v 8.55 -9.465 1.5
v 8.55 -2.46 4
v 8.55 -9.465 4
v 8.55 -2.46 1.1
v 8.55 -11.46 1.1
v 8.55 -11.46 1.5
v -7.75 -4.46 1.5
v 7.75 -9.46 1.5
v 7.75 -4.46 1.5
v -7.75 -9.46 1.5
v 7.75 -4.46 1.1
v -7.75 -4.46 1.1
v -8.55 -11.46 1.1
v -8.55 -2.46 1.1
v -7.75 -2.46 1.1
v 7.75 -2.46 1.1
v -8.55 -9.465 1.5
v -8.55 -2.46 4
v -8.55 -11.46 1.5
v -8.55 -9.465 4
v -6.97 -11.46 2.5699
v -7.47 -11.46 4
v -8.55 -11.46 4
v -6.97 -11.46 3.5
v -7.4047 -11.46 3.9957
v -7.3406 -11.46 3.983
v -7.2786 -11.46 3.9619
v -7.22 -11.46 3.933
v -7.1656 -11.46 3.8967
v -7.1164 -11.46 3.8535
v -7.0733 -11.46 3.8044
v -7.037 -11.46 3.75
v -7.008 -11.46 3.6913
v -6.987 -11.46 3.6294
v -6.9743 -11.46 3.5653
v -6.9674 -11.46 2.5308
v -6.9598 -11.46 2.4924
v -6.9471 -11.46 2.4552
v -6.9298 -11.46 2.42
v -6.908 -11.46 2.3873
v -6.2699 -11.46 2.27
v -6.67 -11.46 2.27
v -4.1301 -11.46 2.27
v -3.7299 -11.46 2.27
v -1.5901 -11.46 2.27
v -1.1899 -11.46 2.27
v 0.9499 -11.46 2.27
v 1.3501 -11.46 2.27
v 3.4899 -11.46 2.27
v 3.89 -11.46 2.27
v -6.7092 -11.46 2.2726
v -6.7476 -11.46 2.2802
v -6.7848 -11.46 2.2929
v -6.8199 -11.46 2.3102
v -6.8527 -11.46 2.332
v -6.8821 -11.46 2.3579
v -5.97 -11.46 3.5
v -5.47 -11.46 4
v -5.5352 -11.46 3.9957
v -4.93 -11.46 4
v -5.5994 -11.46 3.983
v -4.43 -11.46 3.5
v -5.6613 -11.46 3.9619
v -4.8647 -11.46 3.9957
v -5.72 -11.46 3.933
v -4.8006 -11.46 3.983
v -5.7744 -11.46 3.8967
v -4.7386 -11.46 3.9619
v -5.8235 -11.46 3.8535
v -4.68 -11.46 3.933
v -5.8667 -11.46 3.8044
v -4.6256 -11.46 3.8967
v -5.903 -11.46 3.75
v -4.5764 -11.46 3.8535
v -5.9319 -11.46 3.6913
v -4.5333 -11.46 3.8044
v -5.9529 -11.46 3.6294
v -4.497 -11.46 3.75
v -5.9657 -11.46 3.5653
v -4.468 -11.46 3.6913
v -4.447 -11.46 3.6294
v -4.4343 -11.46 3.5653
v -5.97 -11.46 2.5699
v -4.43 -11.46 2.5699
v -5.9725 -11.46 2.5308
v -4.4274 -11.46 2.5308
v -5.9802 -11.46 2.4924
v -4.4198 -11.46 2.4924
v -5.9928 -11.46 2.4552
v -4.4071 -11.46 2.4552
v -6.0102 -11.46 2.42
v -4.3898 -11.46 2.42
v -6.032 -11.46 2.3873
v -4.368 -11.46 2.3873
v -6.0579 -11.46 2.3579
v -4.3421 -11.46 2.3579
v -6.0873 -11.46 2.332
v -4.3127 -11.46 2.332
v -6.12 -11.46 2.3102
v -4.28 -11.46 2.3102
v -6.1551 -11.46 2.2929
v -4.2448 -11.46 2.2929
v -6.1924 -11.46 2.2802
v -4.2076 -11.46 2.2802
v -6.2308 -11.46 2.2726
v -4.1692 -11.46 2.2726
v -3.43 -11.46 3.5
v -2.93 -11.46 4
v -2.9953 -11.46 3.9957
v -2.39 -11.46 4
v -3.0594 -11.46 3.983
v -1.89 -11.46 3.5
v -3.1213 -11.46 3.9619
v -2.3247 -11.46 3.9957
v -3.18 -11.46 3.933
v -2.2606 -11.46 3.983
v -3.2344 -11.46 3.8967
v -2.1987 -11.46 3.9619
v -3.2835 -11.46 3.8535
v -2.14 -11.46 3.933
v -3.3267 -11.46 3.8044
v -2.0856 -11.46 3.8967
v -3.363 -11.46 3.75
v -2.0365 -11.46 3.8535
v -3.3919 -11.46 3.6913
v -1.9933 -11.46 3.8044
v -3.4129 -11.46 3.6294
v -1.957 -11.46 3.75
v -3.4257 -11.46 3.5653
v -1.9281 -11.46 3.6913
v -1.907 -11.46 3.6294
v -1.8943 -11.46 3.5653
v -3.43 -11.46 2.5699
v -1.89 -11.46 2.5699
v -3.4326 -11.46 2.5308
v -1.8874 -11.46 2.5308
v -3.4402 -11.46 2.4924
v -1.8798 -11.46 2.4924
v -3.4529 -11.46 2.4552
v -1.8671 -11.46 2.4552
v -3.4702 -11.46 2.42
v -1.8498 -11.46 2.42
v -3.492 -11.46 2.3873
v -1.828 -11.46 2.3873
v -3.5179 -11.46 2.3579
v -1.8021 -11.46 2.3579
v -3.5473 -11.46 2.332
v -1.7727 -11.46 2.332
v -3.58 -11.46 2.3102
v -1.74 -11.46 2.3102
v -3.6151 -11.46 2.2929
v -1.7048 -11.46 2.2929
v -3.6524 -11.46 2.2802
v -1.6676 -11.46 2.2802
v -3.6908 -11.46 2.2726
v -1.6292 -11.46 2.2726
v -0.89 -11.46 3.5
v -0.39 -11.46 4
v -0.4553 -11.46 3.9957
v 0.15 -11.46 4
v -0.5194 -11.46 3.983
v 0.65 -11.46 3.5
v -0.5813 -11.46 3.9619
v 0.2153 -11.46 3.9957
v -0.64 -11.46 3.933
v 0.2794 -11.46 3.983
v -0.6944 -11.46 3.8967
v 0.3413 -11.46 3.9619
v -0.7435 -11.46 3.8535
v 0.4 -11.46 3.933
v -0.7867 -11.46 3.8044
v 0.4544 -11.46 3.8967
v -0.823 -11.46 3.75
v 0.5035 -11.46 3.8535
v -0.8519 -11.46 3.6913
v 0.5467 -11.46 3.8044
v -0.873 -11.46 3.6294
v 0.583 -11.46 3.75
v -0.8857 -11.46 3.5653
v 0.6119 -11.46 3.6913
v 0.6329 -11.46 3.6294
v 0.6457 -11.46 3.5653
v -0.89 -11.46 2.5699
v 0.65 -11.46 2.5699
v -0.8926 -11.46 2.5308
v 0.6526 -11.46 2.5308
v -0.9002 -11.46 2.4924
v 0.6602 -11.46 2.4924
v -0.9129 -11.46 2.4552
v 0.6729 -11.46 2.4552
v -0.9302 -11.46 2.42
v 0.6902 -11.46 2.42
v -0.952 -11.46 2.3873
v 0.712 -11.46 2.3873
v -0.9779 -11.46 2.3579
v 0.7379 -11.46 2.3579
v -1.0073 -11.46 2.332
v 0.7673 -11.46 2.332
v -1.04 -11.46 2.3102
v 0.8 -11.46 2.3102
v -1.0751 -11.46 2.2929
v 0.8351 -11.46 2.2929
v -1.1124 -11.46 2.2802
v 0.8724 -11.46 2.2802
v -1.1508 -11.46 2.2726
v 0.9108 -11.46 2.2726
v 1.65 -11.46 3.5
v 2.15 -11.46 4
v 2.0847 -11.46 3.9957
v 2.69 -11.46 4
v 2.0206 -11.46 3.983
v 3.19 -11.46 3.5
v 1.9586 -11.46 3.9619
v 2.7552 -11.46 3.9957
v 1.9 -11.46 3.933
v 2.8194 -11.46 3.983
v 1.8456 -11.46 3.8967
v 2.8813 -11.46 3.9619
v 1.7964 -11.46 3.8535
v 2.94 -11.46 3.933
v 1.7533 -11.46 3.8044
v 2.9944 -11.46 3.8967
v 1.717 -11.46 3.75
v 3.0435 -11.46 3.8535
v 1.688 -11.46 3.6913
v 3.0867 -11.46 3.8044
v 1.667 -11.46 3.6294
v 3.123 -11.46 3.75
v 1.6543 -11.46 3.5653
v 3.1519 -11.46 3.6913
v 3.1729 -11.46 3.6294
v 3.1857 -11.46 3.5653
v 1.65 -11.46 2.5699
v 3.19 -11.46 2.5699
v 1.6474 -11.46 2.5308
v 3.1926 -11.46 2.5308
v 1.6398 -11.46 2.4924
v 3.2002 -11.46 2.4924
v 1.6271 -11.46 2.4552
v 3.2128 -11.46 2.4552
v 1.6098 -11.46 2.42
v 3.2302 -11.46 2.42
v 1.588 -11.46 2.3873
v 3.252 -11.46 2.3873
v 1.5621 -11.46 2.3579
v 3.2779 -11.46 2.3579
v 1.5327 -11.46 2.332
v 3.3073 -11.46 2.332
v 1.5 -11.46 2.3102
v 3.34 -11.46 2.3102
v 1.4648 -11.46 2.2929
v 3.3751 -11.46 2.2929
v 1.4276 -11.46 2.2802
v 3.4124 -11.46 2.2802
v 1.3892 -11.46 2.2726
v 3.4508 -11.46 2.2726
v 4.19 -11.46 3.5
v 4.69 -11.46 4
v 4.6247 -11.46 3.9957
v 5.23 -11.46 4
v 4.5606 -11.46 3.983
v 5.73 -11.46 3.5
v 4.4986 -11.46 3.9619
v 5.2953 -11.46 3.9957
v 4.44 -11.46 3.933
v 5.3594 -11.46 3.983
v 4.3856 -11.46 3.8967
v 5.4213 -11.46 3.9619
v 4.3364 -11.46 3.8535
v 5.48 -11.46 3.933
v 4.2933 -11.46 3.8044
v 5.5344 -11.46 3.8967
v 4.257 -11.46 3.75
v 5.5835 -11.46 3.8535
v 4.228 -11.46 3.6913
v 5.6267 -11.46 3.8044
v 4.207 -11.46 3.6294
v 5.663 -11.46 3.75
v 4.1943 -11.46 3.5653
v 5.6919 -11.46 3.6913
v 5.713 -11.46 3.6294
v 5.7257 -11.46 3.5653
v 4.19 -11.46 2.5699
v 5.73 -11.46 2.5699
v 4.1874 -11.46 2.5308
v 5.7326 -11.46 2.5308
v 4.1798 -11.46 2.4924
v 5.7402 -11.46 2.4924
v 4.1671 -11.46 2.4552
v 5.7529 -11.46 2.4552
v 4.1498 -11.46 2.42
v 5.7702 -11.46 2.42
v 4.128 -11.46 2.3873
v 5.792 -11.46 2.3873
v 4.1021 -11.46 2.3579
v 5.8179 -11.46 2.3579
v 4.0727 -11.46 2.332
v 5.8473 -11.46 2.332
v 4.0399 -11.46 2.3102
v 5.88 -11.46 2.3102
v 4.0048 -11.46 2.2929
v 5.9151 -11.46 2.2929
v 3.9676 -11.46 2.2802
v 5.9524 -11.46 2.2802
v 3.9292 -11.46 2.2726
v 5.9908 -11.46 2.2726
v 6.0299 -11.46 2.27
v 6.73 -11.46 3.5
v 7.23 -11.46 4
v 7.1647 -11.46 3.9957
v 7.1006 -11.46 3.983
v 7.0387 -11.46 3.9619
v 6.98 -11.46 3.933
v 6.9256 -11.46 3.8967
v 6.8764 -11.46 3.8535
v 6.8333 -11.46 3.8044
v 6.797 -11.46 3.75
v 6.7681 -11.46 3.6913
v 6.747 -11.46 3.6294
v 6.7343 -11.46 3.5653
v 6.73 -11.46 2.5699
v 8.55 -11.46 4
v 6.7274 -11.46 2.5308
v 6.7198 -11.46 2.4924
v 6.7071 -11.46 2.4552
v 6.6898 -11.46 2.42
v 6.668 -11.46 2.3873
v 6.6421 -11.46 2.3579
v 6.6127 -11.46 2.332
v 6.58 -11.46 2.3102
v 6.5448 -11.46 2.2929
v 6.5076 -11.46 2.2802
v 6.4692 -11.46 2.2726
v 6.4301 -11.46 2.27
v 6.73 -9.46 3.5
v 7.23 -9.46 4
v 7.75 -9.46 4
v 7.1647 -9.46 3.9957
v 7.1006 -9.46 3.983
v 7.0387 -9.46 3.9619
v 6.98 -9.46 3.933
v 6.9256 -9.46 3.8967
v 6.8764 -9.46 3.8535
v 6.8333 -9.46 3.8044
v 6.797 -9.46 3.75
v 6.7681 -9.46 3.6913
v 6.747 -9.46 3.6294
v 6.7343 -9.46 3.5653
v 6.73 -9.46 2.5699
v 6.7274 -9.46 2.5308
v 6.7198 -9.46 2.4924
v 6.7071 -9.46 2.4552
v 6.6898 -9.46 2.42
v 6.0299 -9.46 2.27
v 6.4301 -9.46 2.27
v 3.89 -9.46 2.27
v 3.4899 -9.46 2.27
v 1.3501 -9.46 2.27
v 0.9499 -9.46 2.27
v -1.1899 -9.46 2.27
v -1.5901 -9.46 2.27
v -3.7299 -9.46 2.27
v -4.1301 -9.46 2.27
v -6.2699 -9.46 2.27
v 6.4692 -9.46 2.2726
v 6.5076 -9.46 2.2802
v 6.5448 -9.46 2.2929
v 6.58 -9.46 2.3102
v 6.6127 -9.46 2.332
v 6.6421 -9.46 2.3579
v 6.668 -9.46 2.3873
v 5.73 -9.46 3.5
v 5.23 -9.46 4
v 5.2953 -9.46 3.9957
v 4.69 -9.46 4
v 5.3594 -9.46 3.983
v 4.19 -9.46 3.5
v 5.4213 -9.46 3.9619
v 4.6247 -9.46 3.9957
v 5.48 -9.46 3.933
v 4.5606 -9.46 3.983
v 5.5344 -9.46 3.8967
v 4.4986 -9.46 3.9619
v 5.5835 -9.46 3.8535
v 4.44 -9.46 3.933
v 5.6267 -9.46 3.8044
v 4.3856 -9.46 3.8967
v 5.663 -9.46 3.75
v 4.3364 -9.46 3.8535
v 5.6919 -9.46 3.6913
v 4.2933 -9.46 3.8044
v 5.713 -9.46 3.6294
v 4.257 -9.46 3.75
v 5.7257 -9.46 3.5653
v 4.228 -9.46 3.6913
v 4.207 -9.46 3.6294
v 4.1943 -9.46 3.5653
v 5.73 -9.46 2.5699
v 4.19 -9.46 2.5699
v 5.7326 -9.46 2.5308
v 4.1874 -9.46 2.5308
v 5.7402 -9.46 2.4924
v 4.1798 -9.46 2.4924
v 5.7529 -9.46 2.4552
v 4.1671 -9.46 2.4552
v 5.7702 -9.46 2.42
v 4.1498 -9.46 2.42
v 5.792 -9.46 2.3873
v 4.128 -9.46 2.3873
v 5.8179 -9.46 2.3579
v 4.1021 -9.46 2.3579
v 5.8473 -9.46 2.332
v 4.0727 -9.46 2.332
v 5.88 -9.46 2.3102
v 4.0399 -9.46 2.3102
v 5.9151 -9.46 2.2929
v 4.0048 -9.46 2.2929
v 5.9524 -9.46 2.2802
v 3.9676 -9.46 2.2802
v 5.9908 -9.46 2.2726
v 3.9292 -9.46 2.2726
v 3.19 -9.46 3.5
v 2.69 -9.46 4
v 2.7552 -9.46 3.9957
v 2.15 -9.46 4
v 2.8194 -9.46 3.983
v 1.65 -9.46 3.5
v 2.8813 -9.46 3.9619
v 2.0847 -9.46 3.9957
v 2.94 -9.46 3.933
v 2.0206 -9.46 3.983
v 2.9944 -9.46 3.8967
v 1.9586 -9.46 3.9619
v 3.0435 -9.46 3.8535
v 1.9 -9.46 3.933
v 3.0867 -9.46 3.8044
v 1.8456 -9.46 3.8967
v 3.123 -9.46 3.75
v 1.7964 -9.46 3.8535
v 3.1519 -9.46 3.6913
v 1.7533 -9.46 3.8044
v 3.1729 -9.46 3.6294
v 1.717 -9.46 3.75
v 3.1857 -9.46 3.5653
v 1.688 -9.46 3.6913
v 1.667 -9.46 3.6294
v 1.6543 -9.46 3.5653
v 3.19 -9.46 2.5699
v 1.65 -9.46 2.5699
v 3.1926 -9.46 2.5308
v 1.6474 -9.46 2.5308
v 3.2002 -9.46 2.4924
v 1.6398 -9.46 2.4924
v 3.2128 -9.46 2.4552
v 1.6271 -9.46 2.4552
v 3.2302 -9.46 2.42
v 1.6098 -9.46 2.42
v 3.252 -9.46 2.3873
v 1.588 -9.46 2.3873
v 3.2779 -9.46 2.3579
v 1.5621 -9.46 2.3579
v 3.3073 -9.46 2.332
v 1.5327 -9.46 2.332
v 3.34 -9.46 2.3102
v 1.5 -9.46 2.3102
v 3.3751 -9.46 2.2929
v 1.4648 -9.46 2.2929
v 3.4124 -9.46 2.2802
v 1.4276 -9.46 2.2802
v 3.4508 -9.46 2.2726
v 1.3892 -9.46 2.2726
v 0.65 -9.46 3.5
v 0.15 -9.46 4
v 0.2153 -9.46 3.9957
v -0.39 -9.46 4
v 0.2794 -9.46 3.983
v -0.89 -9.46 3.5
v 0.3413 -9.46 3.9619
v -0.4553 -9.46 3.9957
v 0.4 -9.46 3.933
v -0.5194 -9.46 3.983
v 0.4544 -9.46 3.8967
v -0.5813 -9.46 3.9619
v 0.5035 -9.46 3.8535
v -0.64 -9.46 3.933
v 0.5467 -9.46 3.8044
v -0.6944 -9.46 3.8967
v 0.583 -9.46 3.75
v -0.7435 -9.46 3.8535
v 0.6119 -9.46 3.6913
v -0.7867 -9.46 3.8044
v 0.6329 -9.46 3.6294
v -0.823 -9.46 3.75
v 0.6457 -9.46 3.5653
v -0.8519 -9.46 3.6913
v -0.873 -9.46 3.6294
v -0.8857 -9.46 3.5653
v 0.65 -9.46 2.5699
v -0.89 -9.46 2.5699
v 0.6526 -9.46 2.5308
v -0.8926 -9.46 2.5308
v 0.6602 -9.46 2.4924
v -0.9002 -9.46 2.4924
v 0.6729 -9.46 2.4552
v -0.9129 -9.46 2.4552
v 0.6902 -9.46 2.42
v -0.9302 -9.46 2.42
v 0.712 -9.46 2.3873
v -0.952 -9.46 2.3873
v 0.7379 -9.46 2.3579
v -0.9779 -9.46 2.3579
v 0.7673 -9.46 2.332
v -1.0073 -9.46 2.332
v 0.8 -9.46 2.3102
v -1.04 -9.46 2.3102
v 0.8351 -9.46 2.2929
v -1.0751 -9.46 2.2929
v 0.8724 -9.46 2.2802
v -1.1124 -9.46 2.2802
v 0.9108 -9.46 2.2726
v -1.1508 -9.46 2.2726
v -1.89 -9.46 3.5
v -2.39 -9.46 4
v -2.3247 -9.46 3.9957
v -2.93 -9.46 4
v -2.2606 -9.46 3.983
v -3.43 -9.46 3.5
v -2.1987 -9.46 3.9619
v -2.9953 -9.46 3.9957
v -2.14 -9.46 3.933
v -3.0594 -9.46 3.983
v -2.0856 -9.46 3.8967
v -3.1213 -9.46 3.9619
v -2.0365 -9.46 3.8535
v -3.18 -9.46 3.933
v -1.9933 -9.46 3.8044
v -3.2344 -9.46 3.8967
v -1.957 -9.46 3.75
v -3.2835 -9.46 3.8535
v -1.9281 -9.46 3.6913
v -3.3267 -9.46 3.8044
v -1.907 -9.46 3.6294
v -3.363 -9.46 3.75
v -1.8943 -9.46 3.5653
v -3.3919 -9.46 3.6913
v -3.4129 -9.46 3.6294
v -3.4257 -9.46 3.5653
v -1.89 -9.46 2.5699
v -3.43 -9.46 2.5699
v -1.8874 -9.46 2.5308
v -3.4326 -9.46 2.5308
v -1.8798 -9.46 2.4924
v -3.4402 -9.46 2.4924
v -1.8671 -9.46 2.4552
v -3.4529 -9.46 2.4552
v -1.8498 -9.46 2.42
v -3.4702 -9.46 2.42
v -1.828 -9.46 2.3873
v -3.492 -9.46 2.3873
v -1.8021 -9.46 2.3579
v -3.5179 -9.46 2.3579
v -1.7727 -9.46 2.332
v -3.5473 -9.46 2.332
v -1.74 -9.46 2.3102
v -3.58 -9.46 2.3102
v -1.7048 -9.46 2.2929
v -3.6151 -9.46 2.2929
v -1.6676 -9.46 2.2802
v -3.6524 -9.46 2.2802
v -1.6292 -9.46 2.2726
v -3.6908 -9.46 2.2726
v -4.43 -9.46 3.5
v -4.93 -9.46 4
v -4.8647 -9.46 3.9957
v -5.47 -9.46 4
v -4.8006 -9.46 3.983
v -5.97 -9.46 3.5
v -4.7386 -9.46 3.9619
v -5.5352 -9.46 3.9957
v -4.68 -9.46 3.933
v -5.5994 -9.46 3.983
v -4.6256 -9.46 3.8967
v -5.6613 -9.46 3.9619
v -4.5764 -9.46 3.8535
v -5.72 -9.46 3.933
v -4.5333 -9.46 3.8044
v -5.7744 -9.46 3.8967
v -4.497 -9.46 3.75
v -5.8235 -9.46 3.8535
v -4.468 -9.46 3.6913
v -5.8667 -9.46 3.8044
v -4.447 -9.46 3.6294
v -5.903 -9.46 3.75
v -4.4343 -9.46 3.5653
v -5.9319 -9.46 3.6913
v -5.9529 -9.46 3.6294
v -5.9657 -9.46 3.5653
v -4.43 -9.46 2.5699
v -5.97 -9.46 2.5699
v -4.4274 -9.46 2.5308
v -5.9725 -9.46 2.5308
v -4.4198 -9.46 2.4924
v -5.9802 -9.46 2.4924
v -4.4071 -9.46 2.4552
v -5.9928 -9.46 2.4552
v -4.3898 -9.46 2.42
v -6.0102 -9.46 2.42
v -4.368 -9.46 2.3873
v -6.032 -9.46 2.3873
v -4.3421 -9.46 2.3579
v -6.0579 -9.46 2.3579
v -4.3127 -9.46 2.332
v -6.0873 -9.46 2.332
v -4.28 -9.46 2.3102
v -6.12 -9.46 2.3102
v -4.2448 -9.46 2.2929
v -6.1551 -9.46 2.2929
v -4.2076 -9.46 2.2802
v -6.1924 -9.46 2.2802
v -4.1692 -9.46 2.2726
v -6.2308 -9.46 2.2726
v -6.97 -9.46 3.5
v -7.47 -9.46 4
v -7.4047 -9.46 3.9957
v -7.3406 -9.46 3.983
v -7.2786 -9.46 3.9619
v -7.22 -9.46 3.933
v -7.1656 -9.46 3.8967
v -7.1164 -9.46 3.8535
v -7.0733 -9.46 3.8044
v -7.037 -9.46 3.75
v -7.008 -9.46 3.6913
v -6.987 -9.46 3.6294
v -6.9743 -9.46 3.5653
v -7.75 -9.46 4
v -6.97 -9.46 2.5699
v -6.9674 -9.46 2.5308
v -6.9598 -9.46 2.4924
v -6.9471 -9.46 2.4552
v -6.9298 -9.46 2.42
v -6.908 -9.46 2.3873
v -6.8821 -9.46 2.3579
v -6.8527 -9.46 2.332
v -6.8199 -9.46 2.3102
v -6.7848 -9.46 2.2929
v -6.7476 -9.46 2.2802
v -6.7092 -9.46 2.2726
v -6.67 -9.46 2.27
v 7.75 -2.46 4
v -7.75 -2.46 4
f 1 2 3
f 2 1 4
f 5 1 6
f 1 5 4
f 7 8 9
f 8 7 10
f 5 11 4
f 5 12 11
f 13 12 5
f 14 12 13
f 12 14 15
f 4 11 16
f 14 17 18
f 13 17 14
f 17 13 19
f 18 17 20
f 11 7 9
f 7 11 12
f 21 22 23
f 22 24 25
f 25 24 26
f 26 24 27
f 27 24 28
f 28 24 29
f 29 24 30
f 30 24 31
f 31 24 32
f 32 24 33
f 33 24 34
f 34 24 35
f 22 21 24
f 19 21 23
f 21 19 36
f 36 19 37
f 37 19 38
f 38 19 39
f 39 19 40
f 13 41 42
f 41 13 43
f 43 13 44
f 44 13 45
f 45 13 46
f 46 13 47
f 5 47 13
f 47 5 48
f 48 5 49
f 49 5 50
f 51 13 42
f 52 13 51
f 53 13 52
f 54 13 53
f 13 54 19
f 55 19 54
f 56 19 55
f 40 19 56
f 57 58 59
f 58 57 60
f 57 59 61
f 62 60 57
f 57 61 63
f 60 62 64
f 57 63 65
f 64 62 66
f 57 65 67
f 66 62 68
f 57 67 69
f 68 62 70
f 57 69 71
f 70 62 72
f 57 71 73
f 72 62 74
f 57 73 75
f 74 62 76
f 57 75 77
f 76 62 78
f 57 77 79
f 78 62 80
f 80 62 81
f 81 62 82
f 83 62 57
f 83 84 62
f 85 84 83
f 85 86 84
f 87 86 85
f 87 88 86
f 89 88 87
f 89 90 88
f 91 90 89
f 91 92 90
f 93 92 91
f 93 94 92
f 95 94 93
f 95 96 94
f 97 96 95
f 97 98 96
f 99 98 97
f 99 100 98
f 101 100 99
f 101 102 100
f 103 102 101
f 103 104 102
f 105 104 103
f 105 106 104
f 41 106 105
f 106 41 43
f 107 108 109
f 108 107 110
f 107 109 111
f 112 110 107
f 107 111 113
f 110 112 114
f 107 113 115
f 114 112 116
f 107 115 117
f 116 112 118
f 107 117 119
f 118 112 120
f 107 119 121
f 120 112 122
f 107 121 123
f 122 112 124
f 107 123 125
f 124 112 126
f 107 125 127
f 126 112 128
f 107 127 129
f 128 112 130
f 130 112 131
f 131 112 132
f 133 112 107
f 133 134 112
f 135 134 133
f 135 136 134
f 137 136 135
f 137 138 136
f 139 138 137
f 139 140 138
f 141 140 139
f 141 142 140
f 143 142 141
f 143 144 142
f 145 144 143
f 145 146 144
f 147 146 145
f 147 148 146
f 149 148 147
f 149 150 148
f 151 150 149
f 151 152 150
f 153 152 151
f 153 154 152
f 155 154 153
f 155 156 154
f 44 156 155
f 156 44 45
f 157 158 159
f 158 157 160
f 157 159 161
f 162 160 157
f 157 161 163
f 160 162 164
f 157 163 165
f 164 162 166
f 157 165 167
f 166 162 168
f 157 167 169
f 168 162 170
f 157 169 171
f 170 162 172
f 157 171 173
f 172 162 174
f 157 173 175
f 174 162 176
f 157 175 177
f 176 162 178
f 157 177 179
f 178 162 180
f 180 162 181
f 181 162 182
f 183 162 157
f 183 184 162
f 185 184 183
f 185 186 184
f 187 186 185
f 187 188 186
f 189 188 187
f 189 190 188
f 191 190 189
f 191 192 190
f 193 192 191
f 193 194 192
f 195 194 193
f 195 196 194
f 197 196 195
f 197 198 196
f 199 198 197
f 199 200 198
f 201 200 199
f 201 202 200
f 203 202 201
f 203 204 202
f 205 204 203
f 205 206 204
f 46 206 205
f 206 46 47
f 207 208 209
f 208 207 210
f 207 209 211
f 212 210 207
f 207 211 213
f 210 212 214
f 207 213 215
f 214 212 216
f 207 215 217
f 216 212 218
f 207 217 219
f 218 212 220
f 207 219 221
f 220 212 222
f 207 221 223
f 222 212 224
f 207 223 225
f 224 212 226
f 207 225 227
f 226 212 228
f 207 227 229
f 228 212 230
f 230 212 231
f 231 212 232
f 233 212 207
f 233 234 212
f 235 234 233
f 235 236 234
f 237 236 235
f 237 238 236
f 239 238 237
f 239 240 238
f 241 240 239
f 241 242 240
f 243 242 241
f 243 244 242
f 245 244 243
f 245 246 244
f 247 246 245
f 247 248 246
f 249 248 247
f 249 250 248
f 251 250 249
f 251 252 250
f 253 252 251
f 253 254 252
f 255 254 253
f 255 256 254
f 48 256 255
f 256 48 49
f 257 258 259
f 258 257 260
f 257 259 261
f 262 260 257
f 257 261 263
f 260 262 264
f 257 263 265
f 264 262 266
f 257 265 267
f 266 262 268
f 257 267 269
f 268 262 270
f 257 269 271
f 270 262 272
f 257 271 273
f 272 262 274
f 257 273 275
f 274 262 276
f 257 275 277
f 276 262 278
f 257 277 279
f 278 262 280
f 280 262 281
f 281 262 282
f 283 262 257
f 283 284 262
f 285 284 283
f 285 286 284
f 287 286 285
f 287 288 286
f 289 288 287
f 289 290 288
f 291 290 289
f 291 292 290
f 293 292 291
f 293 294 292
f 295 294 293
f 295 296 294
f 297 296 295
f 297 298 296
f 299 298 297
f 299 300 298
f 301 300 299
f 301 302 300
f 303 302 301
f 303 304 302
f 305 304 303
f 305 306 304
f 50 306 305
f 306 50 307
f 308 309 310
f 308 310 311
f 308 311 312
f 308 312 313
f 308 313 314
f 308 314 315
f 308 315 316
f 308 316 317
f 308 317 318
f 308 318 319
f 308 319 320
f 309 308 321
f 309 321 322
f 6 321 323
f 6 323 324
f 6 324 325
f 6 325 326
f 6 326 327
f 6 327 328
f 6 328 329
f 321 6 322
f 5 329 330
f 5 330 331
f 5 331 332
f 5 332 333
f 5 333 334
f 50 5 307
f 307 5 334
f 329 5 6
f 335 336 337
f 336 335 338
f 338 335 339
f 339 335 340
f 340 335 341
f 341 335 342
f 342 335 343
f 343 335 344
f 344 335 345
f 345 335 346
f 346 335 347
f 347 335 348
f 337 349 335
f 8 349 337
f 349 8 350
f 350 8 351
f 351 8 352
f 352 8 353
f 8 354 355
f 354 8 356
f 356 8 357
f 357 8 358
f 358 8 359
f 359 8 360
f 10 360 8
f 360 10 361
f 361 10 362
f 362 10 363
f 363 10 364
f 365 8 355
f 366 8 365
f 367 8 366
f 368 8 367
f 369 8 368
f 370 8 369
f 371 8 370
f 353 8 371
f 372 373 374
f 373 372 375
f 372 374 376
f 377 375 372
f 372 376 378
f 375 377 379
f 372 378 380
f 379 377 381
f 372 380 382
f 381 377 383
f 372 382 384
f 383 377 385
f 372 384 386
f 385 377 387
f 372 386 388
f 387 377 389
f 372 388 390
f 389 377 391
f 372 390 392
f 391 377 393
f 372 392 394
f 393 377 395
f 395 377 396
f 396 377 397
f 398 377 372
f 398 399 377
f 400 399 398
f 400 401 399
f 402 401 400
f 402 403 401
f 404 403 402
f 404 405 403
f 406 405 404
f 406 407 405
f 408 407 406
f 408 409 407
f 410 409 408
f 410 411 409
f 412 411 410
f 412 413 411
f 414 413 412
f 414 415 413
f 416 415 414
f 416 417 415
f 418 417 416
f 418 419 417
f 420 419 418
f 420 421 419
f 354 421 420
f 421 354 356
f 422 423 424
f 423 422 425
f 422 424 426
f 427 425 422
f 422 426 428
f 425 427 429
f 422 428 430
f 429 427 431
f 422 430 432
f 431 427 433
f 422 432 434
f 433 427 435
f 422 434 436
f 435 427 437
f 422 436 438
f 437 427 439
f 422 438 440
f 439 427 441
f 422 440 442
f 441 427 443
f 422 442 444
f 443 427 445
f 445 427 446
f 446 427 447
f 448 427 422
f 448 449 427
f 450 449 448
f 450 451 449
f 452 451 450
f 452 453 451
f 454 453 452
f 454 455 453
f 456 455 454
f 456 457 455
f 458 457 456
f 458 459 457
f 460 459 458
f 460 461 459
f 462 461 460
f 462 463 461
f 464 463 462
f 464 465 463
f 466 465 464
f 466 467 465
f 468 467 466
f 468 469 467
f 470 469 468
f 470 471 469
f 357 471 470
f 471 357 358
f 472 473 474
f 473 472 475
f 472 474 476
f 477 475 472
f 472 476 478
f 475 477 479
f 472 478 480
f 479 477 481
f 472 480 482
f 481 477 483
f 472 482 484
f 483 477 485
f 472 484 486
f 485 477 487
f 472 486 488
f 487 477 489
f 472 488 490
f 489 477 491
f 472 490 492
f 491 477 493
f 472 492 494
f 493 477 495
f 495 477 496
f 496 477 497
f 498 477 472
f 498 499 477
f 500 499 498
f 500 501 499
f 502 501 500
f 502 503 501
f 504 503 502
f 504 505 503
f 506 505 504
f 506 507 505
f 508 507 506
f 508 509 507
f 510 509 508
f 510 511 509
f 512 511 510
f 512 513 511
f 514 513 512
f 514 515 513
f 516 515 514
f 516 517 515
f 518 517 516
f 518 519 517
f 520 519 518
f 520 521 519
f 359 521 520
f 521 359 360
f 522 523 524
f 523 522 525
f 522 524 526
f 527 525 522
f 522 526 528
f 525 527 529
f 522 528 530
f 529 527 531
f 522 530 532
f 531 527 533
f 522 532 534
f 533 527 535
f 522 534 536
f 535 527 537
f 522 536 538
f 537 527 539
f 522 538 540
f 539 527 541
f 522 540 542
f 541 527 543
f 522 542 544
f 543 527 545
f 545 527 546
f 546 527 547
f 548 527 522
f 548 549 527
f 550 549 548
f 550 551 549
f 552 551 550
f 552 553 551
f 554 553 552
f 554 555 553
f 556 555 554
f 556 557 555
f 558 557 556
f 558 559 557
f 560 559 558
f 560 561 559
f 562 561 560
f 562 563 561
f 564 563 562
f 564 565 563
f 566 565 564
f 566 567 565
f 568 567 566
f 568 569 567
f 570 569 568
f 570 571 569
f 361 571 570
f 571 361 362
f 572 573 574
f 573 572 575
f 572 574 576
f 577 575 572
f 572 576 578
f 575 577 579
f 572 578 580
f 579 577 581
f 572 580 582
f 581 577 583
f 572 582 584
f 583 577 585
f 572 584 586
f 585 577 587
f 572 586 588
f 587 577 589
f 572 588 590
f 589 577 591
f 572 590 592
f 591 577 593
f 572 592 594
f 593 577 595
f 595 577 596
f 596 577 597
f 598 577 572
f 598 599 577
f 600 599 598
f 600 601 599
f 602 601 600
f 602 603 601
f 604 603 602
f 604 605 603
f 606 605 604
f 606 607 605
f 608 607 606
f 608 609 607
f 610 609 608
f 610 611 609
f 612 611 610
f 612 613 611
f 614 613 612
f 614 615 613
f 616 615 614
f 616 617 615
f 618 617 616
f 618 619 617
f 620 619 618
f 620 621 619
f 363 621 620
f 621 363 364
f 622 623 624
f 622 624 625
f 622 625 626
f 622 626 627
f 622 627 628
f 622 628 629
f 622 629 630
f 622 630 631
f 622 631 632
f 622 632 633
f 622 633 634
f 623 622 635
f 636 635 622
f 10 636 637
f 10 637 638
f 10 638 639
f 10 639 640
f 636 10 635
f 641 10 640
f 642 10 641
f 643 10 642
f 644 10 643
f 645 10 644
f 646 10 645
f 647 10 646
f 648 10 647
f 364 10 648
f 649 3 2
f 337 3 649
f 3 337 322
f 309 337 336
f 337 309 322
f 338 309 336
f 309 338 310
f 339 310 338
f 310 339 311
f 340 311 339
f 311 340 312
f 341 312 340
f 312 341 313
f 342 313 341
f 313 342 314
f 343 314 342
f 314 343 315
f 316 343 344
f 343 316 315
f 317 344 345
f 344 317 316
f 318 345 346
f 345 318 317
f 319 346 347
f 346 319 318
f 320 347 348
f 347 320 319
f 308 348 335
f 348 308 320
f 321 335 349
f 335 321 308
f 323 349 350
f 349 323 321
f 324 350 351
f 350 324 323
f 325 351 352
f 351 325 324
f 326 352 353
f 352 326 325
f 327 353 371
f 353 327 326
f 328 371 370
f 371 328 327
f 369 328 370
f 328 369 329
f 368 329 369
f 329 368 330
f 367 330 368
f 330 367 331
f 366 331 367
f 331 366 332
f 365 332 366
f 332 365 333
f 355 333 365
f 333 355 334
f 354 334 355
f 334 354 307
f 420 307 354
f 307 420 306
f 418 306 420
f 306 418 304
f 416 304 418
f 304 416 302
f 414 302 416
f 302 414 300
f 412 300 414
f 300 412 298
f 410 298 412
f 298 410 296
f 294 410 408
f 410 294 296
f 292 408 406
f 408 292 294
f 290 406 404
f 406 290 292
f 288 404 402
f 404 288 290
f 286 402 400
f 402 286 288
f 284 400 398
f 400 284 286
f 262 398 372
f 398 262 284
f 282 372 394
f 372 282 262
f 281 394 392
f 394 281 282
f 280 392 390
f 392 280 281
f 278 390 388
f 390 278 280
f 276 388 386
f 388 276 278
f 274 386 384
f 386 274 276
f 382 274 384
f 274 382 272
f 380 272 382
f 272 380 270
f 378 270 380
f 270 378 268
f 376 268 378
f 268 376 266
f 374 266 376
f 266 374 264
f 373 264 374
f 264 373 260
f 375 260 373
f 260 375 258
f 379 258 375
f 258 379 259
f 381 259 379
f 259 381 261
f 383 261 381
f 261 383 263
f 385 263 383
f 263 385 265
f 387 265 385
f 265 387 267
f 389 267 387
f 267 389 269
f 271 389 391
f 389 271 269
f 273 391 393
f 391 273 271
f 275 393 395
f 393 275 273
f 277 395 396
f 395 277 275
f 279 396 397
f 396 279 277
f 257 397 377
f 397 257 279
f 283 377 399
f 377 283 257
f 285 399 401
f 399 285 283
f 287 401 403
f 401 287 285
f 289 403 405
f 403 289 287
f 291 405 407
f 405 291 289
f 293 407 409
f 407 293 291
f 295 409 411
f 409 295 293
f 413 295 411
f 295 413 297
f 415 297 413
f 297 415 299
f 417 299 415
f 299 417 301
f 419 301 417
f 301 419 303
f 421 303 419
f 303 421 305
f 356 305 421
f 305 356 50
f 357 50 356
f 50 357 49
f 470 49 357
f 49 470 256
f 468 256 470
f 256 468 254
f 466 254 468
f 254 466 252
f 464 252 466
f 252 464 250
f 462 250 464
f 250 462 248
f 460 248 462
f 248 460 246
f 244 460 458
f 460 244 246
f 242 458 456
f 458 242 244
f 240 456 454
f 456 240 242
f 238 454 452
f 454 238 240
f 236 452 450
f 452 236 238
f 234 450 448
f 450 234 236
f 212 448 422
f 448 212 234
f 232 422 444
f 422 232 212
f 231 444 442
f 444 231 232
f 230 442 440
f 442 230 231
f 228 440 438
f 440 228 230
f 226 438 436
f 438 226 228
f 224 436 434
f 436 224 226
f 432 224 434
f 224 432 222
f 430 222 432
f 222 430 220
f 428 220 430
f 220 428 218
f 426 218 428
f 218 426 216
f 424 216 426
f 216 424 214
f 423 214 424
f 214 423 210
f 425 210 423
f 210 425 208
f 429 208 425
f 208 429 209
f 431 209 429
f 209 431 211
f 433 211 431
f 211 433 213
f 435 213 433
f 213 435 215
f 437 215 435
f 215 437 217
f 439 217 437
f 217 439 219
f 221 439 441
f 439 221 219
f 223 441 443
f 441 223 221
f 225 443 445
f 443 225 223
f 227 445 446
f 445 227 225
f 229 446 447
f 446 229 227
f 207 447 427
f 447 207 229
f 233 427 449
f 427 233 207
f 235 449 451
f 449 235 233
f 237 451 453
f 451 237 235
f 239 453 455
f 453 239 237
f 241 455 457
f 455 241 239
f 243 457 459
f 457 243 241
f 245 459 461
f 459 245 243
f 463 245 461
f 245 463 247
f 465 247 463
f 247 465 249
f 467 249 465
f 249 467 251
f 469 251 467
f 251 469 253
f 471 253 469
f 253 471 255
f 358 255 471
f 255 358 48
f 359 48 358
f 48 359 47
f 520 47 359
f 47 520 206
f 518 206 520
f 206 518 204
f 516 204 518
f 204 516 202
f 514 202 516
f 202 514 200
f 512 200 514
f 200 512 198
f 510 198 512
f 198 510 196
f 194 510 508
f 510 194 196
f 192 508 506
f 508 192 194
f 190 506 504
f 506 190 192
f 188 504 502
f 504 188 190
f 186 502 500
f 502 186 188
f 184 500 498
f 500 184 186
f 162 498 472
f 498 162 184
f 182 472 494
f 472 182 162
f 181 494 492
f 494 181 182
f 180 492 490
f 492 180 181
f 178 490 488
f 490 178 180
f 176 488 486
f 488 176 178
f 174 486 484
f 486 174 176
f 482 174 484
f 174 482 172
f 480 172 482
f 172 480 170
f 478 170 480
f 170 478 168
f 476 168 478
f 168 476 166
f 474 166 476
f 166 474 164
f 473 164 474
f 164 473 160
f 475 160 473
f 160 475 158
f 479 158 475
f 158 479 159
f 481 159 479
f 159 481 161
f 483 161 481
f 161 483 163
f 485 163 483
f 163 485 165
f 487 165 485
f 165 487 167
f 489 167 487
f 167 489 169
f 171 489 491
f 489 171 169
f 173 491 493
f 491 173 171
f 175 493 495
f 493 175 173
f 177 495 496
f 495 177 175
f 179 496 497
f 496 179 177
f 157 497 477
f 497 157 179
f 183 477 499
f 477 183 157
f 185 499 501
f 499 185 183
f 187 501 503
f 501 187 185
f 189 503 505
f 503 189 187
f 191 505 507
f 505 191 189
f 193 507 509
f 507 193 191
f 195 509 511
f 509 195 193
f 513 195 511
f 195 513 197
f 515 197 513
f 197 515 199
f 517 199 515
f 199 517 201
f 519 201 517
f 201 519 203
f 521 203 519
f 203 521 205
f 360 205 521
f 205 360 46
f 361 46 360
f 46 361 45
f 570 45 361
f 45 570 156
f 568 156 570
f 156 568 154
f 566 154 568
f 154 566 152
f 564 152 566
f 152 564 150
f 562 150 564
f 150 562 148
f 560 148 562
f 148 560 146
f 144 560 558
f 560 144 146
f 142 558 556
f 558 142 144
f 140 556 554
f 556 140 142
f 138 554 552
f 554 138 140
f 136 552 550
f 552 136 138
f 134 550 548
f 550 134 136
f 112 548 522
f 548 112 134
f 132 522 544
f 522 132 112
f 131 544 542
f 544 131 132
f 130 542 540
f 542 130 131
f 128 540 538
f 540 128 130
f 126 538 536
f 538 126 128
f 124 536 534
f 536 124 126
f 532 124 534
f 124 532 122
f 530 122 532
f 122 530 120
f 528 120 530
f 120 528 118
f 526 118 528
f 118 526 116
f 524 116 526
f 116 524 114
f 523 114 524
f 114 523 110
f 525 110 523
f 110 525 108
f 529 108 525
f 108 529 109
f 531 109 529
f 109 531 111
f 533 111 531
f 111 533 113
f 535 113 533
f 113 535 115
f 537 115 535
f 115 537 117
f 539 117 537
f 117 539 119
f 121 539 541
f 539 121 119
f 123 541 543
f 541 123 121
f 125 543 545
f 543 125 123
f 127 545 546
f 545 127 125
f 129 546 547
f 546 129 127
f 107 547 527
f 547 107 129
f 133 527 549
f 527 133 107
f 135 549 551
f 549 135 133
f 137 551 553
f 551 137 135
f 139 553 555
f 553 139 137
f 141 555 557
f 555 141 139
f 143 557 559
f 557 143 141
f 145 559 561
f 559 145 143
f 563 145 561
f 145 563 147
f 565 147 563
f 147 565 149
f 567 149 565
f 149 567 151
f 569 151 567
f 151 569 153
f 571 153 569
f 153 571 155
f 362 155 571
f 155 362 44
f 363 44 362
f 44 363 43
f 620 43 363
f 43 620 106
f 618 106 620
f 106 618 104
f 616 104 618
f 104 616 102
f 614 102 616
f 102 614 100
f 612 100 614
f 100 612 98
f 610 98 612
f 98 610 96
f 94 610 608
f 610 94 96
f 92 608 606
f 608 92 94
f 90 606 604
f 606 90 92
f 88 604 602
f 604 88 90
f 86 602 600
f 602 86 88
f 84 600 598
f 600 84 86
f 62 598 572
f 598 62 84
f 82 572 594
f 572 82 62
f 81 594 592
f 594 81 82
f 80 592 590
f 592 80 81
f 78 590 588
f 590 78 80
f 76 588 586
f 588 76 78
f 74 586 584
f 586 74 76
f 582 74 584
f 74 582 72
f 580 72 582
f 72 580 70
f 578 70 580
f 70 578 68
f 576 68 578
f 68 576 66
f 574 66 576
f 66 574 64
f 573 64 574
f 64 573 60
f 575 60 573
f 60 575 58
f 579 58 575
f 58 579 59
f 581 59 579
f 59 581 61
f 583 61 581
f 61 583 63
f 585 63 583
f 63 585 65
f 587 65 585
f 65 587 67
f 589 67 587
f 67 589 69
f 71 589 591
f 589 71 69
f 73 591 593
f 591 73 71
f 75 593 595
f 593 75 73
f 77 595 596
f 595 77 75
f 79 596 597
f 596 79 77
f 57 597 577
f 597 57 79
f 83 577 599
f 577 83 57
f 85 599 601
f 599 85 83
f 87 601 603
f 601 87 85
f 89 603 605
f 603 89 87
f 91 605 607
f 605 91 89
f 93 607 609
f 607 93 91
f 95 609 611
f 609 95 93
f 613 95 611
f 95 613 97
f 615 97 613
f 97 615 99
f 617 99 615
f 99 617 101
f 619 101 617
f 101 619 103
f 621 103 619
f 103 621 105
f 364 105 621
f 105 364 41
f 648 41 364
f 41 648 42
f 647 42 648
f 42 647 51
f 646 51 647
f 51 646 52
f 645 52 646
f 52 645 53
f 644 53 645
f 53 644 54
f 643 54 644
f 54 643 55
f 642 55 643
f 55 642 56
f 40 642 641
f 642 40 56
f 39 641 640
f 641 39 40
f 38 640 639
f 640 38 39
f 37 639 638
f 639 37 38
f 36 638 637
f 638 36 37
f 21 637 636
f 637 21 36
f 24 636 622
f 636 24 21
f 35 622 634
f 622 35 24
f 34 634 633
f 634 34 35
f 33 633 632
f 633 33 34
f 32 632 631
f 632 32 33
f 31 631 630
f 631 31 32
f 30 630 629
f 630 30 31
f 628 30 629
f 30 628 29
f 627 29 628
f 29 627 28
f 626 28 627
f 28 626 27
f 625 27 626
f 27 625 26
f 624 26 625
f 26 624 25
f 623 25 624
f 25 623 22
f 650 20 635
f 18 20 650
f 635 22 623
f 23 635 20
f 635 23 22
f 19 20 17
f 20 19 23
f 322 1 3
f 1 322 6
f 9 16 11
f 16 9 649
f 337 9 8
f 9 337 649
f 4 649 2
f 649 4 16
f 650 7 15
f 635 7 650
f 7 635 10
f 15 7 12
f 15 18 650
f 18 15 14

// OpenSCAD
// file: strain_relief_comb.scad
// Strain-relief comb — shared section for #810-001 and #810-002.
// No part and no top-level geometry: it only defines modules.
//
// The comb grips the C-708 6-pin cable's wires. Its section is drawn in 2D in
// x and "height" (the z of the parts' frame); the including part extrudes it
// along y. Comb thickness along y is COMB_T.
//
// The six grooves sit at x = COMB_CX + (k - 2.5) * COMB_PITCH, k = 0..5. The
// meshes measure the pattern centre at -0.131 (Top) and -0.109 (Bottom); the
// design value -0.120 is the one both parts take.
//
//     groove width        1.000     pitch 2.540
//     groove-end corners  R0.3      where a groove meets its ceiling or floor
//     tooth-tip corners   R0.5      only where a tip meets a groove; the
//                                   comb's outer ends, x = +-8.55, are square
//     comb length         x +-8.55

COMB_T        = 2.000;
COMB_HALF     = 8.550;
COMB_CX       = -0.120;
COMB_PITCH    = 2.540;
COMB_GROOVES  = 6;
COMB_GROOVE_W = 1.000;
COMB_END_R    = 0.300;
COMB_TIP_R    = 0.500;

function comb_xs() =
    [for (k = [0 : COMB_GROOVES - 1]) COMB_CX + (k - (COMB_GROOVES - 1) / 2) * COMB_PITCH];

// The grooves' voids with the tips at u = 0 and the ends at u = depth; they
// overrun the tips so only the end corners are rounded within the material.
module comb_voids(depth)
    offset(r = COMB_END_R) offset(delta = -COMB_END_R)
        for (x = comb_xs())
            translate([x - COMB_GROOVE_W / 2, -1]) square([COMB_GROOVE_W, depth + 1]);

// The band's material, wider than the comb and deeper than its band, so that
// opening it rounds only the tips at the grooves; the caller trims it back to
// the square ends and the band's far edge.
module comb_material(depth)
    offset(r = COMB_TIP_R) offset(delta = -COMB_TIP_R)
        difference() {
            translate([-COMB_HALF - 2, 0]) square([2 * COMB_HALF + 4, depth + 2]);
            comb_voids(depth);
        }

// The comb's 2D section in x and height. `tip` is the teeth tips' height,
// `end` the grooves' ceiling or floor, `far` the far edge of the full-material
// band, which runs from `end` towards `far` (the same side as `end` lies from
// `tip`).
module comb_section_2d(tip, end, far) {
    dir = sign(end - tip);
    translate([0, tip]) scale([1, dir])
        intersection() {
            comb_material(abs(end - tip));
            translate([-COMB_HALF, -1]) square([2 * COMB_HALF, abs(far - tip) + 1]);
        }
}
// main file
// #810-002 6-Pin Strain Relief (Bottom) — parametric source.
// The lower half of the clamp that grips the C-708 6-pin cable's wires. Its
// comb stands up to meet the Top's comb (#810-001) face to face, and its two
// rails carry the Top's plate.
//
//   config = "previous" — a faithful recreation of the reference mesh
//                         (../Reference/meshes/800-Harness/).
//   config = "revised"  — identical to "previous"; see FITS.
//
// FRAME. The reference's own: x along the comb, the plate's underside at
// z = 1.1, the comb's mating face at y = -11.46.
//
// Measured from the reference (scadmesh), feature IDs as in
// 810-002_6PinStrainReliefBottom.view.json:
//
//     ID  feature   value
//     P1  plate     x +-8.55, y -11.46 .. -4.46, z 1.1 .. 1.5; the
//                   rails' feet carry on to y -2.46, leaving a notch
//                   x +-7.75, y -4.46 .. -2.46 at the back
//     K1  comb      y -11.46 .. -9.46; teeth stand to tips at z 4.0; six
//                   grooves fall to a floor at z 2.27 (the section is
//                   strain_relief_comb.scad's)
//     R1  rails     x 7.75 .. 8.55 and -8.55 .. -7.75, y -9.46 .. -2.46,
//                   z 1.1 .. 4.0
//
// The measured groove pattern centre is -0.109; the shared design value is
// -0.120 (strain_relief_comb.scad).
//
// CONSTRUCTION. Rung 1, region split: the plate cuboid joined to the comb's
// section extruded 2.0 along y and to the two rails, lapped by 0.005.
//
// FITS: none. The Top's plate seats on the rails at z 4.0 and the two combs
// meet face to face at y -11.46 (seats, exempt); the grooves grip the wires.
// "revised" therefore equals "previous".

include <strain_relief_comb.scad>

/* [Configuration] */
// Parameter set: previous (reference) or revised
config = "previous"; // [previous, revised]

/* [Hidden] */
$fn = 48;
LAP      = 0.005;
PLATE_Y  = [-11.46, -4.46];
PLATE_Z  = [1.1, 1.5];
TIP_Z    = 4.0;
FLOOR_Z  = 2.27;
RAIL_X   = [7.75, 8.55];
RAIL_Y   = [-9.46, -2.46];
RAIL_TOP = 4.0;
BAND_DN  = 0.2;     // the comb's band runs this far up from the plate's underside

module plate()
    translate([-COMB_HALF, PLATE_Y[0], PLATE_Z[0]])
        cube([2 * COMB_HALF, PLATE_Y[1] - PLATE_Y[0], PLATE_Z[1] - PLATE_Z[0]]);

module comb()
    translate([0, PLATE_Y[0] + COMB_T, 0]) rotate([90, 0, 0])
        linear_extrude(COMB_T) comb_section_2d(TIP_Z, FLOOR_Z, PLATE_Z[0] + BAND_DN);

module rail(side)
    translate([side > 0 ? RAIL_X[0] : -RAIL_X[1], RAIL_Y[0] - LAP, PLATE_Z[0]])
        cube([RAIL_X[1] - RAIL_X[0], RAIL_Y[1] - RAIL_Y[0] + LAP, RAIL_TOP - PLATE_Z[0]]);

module strain_relief_bottom() union() { plate(); comb(); rail(1); rail(-1); }

strain_relief_bottom();
